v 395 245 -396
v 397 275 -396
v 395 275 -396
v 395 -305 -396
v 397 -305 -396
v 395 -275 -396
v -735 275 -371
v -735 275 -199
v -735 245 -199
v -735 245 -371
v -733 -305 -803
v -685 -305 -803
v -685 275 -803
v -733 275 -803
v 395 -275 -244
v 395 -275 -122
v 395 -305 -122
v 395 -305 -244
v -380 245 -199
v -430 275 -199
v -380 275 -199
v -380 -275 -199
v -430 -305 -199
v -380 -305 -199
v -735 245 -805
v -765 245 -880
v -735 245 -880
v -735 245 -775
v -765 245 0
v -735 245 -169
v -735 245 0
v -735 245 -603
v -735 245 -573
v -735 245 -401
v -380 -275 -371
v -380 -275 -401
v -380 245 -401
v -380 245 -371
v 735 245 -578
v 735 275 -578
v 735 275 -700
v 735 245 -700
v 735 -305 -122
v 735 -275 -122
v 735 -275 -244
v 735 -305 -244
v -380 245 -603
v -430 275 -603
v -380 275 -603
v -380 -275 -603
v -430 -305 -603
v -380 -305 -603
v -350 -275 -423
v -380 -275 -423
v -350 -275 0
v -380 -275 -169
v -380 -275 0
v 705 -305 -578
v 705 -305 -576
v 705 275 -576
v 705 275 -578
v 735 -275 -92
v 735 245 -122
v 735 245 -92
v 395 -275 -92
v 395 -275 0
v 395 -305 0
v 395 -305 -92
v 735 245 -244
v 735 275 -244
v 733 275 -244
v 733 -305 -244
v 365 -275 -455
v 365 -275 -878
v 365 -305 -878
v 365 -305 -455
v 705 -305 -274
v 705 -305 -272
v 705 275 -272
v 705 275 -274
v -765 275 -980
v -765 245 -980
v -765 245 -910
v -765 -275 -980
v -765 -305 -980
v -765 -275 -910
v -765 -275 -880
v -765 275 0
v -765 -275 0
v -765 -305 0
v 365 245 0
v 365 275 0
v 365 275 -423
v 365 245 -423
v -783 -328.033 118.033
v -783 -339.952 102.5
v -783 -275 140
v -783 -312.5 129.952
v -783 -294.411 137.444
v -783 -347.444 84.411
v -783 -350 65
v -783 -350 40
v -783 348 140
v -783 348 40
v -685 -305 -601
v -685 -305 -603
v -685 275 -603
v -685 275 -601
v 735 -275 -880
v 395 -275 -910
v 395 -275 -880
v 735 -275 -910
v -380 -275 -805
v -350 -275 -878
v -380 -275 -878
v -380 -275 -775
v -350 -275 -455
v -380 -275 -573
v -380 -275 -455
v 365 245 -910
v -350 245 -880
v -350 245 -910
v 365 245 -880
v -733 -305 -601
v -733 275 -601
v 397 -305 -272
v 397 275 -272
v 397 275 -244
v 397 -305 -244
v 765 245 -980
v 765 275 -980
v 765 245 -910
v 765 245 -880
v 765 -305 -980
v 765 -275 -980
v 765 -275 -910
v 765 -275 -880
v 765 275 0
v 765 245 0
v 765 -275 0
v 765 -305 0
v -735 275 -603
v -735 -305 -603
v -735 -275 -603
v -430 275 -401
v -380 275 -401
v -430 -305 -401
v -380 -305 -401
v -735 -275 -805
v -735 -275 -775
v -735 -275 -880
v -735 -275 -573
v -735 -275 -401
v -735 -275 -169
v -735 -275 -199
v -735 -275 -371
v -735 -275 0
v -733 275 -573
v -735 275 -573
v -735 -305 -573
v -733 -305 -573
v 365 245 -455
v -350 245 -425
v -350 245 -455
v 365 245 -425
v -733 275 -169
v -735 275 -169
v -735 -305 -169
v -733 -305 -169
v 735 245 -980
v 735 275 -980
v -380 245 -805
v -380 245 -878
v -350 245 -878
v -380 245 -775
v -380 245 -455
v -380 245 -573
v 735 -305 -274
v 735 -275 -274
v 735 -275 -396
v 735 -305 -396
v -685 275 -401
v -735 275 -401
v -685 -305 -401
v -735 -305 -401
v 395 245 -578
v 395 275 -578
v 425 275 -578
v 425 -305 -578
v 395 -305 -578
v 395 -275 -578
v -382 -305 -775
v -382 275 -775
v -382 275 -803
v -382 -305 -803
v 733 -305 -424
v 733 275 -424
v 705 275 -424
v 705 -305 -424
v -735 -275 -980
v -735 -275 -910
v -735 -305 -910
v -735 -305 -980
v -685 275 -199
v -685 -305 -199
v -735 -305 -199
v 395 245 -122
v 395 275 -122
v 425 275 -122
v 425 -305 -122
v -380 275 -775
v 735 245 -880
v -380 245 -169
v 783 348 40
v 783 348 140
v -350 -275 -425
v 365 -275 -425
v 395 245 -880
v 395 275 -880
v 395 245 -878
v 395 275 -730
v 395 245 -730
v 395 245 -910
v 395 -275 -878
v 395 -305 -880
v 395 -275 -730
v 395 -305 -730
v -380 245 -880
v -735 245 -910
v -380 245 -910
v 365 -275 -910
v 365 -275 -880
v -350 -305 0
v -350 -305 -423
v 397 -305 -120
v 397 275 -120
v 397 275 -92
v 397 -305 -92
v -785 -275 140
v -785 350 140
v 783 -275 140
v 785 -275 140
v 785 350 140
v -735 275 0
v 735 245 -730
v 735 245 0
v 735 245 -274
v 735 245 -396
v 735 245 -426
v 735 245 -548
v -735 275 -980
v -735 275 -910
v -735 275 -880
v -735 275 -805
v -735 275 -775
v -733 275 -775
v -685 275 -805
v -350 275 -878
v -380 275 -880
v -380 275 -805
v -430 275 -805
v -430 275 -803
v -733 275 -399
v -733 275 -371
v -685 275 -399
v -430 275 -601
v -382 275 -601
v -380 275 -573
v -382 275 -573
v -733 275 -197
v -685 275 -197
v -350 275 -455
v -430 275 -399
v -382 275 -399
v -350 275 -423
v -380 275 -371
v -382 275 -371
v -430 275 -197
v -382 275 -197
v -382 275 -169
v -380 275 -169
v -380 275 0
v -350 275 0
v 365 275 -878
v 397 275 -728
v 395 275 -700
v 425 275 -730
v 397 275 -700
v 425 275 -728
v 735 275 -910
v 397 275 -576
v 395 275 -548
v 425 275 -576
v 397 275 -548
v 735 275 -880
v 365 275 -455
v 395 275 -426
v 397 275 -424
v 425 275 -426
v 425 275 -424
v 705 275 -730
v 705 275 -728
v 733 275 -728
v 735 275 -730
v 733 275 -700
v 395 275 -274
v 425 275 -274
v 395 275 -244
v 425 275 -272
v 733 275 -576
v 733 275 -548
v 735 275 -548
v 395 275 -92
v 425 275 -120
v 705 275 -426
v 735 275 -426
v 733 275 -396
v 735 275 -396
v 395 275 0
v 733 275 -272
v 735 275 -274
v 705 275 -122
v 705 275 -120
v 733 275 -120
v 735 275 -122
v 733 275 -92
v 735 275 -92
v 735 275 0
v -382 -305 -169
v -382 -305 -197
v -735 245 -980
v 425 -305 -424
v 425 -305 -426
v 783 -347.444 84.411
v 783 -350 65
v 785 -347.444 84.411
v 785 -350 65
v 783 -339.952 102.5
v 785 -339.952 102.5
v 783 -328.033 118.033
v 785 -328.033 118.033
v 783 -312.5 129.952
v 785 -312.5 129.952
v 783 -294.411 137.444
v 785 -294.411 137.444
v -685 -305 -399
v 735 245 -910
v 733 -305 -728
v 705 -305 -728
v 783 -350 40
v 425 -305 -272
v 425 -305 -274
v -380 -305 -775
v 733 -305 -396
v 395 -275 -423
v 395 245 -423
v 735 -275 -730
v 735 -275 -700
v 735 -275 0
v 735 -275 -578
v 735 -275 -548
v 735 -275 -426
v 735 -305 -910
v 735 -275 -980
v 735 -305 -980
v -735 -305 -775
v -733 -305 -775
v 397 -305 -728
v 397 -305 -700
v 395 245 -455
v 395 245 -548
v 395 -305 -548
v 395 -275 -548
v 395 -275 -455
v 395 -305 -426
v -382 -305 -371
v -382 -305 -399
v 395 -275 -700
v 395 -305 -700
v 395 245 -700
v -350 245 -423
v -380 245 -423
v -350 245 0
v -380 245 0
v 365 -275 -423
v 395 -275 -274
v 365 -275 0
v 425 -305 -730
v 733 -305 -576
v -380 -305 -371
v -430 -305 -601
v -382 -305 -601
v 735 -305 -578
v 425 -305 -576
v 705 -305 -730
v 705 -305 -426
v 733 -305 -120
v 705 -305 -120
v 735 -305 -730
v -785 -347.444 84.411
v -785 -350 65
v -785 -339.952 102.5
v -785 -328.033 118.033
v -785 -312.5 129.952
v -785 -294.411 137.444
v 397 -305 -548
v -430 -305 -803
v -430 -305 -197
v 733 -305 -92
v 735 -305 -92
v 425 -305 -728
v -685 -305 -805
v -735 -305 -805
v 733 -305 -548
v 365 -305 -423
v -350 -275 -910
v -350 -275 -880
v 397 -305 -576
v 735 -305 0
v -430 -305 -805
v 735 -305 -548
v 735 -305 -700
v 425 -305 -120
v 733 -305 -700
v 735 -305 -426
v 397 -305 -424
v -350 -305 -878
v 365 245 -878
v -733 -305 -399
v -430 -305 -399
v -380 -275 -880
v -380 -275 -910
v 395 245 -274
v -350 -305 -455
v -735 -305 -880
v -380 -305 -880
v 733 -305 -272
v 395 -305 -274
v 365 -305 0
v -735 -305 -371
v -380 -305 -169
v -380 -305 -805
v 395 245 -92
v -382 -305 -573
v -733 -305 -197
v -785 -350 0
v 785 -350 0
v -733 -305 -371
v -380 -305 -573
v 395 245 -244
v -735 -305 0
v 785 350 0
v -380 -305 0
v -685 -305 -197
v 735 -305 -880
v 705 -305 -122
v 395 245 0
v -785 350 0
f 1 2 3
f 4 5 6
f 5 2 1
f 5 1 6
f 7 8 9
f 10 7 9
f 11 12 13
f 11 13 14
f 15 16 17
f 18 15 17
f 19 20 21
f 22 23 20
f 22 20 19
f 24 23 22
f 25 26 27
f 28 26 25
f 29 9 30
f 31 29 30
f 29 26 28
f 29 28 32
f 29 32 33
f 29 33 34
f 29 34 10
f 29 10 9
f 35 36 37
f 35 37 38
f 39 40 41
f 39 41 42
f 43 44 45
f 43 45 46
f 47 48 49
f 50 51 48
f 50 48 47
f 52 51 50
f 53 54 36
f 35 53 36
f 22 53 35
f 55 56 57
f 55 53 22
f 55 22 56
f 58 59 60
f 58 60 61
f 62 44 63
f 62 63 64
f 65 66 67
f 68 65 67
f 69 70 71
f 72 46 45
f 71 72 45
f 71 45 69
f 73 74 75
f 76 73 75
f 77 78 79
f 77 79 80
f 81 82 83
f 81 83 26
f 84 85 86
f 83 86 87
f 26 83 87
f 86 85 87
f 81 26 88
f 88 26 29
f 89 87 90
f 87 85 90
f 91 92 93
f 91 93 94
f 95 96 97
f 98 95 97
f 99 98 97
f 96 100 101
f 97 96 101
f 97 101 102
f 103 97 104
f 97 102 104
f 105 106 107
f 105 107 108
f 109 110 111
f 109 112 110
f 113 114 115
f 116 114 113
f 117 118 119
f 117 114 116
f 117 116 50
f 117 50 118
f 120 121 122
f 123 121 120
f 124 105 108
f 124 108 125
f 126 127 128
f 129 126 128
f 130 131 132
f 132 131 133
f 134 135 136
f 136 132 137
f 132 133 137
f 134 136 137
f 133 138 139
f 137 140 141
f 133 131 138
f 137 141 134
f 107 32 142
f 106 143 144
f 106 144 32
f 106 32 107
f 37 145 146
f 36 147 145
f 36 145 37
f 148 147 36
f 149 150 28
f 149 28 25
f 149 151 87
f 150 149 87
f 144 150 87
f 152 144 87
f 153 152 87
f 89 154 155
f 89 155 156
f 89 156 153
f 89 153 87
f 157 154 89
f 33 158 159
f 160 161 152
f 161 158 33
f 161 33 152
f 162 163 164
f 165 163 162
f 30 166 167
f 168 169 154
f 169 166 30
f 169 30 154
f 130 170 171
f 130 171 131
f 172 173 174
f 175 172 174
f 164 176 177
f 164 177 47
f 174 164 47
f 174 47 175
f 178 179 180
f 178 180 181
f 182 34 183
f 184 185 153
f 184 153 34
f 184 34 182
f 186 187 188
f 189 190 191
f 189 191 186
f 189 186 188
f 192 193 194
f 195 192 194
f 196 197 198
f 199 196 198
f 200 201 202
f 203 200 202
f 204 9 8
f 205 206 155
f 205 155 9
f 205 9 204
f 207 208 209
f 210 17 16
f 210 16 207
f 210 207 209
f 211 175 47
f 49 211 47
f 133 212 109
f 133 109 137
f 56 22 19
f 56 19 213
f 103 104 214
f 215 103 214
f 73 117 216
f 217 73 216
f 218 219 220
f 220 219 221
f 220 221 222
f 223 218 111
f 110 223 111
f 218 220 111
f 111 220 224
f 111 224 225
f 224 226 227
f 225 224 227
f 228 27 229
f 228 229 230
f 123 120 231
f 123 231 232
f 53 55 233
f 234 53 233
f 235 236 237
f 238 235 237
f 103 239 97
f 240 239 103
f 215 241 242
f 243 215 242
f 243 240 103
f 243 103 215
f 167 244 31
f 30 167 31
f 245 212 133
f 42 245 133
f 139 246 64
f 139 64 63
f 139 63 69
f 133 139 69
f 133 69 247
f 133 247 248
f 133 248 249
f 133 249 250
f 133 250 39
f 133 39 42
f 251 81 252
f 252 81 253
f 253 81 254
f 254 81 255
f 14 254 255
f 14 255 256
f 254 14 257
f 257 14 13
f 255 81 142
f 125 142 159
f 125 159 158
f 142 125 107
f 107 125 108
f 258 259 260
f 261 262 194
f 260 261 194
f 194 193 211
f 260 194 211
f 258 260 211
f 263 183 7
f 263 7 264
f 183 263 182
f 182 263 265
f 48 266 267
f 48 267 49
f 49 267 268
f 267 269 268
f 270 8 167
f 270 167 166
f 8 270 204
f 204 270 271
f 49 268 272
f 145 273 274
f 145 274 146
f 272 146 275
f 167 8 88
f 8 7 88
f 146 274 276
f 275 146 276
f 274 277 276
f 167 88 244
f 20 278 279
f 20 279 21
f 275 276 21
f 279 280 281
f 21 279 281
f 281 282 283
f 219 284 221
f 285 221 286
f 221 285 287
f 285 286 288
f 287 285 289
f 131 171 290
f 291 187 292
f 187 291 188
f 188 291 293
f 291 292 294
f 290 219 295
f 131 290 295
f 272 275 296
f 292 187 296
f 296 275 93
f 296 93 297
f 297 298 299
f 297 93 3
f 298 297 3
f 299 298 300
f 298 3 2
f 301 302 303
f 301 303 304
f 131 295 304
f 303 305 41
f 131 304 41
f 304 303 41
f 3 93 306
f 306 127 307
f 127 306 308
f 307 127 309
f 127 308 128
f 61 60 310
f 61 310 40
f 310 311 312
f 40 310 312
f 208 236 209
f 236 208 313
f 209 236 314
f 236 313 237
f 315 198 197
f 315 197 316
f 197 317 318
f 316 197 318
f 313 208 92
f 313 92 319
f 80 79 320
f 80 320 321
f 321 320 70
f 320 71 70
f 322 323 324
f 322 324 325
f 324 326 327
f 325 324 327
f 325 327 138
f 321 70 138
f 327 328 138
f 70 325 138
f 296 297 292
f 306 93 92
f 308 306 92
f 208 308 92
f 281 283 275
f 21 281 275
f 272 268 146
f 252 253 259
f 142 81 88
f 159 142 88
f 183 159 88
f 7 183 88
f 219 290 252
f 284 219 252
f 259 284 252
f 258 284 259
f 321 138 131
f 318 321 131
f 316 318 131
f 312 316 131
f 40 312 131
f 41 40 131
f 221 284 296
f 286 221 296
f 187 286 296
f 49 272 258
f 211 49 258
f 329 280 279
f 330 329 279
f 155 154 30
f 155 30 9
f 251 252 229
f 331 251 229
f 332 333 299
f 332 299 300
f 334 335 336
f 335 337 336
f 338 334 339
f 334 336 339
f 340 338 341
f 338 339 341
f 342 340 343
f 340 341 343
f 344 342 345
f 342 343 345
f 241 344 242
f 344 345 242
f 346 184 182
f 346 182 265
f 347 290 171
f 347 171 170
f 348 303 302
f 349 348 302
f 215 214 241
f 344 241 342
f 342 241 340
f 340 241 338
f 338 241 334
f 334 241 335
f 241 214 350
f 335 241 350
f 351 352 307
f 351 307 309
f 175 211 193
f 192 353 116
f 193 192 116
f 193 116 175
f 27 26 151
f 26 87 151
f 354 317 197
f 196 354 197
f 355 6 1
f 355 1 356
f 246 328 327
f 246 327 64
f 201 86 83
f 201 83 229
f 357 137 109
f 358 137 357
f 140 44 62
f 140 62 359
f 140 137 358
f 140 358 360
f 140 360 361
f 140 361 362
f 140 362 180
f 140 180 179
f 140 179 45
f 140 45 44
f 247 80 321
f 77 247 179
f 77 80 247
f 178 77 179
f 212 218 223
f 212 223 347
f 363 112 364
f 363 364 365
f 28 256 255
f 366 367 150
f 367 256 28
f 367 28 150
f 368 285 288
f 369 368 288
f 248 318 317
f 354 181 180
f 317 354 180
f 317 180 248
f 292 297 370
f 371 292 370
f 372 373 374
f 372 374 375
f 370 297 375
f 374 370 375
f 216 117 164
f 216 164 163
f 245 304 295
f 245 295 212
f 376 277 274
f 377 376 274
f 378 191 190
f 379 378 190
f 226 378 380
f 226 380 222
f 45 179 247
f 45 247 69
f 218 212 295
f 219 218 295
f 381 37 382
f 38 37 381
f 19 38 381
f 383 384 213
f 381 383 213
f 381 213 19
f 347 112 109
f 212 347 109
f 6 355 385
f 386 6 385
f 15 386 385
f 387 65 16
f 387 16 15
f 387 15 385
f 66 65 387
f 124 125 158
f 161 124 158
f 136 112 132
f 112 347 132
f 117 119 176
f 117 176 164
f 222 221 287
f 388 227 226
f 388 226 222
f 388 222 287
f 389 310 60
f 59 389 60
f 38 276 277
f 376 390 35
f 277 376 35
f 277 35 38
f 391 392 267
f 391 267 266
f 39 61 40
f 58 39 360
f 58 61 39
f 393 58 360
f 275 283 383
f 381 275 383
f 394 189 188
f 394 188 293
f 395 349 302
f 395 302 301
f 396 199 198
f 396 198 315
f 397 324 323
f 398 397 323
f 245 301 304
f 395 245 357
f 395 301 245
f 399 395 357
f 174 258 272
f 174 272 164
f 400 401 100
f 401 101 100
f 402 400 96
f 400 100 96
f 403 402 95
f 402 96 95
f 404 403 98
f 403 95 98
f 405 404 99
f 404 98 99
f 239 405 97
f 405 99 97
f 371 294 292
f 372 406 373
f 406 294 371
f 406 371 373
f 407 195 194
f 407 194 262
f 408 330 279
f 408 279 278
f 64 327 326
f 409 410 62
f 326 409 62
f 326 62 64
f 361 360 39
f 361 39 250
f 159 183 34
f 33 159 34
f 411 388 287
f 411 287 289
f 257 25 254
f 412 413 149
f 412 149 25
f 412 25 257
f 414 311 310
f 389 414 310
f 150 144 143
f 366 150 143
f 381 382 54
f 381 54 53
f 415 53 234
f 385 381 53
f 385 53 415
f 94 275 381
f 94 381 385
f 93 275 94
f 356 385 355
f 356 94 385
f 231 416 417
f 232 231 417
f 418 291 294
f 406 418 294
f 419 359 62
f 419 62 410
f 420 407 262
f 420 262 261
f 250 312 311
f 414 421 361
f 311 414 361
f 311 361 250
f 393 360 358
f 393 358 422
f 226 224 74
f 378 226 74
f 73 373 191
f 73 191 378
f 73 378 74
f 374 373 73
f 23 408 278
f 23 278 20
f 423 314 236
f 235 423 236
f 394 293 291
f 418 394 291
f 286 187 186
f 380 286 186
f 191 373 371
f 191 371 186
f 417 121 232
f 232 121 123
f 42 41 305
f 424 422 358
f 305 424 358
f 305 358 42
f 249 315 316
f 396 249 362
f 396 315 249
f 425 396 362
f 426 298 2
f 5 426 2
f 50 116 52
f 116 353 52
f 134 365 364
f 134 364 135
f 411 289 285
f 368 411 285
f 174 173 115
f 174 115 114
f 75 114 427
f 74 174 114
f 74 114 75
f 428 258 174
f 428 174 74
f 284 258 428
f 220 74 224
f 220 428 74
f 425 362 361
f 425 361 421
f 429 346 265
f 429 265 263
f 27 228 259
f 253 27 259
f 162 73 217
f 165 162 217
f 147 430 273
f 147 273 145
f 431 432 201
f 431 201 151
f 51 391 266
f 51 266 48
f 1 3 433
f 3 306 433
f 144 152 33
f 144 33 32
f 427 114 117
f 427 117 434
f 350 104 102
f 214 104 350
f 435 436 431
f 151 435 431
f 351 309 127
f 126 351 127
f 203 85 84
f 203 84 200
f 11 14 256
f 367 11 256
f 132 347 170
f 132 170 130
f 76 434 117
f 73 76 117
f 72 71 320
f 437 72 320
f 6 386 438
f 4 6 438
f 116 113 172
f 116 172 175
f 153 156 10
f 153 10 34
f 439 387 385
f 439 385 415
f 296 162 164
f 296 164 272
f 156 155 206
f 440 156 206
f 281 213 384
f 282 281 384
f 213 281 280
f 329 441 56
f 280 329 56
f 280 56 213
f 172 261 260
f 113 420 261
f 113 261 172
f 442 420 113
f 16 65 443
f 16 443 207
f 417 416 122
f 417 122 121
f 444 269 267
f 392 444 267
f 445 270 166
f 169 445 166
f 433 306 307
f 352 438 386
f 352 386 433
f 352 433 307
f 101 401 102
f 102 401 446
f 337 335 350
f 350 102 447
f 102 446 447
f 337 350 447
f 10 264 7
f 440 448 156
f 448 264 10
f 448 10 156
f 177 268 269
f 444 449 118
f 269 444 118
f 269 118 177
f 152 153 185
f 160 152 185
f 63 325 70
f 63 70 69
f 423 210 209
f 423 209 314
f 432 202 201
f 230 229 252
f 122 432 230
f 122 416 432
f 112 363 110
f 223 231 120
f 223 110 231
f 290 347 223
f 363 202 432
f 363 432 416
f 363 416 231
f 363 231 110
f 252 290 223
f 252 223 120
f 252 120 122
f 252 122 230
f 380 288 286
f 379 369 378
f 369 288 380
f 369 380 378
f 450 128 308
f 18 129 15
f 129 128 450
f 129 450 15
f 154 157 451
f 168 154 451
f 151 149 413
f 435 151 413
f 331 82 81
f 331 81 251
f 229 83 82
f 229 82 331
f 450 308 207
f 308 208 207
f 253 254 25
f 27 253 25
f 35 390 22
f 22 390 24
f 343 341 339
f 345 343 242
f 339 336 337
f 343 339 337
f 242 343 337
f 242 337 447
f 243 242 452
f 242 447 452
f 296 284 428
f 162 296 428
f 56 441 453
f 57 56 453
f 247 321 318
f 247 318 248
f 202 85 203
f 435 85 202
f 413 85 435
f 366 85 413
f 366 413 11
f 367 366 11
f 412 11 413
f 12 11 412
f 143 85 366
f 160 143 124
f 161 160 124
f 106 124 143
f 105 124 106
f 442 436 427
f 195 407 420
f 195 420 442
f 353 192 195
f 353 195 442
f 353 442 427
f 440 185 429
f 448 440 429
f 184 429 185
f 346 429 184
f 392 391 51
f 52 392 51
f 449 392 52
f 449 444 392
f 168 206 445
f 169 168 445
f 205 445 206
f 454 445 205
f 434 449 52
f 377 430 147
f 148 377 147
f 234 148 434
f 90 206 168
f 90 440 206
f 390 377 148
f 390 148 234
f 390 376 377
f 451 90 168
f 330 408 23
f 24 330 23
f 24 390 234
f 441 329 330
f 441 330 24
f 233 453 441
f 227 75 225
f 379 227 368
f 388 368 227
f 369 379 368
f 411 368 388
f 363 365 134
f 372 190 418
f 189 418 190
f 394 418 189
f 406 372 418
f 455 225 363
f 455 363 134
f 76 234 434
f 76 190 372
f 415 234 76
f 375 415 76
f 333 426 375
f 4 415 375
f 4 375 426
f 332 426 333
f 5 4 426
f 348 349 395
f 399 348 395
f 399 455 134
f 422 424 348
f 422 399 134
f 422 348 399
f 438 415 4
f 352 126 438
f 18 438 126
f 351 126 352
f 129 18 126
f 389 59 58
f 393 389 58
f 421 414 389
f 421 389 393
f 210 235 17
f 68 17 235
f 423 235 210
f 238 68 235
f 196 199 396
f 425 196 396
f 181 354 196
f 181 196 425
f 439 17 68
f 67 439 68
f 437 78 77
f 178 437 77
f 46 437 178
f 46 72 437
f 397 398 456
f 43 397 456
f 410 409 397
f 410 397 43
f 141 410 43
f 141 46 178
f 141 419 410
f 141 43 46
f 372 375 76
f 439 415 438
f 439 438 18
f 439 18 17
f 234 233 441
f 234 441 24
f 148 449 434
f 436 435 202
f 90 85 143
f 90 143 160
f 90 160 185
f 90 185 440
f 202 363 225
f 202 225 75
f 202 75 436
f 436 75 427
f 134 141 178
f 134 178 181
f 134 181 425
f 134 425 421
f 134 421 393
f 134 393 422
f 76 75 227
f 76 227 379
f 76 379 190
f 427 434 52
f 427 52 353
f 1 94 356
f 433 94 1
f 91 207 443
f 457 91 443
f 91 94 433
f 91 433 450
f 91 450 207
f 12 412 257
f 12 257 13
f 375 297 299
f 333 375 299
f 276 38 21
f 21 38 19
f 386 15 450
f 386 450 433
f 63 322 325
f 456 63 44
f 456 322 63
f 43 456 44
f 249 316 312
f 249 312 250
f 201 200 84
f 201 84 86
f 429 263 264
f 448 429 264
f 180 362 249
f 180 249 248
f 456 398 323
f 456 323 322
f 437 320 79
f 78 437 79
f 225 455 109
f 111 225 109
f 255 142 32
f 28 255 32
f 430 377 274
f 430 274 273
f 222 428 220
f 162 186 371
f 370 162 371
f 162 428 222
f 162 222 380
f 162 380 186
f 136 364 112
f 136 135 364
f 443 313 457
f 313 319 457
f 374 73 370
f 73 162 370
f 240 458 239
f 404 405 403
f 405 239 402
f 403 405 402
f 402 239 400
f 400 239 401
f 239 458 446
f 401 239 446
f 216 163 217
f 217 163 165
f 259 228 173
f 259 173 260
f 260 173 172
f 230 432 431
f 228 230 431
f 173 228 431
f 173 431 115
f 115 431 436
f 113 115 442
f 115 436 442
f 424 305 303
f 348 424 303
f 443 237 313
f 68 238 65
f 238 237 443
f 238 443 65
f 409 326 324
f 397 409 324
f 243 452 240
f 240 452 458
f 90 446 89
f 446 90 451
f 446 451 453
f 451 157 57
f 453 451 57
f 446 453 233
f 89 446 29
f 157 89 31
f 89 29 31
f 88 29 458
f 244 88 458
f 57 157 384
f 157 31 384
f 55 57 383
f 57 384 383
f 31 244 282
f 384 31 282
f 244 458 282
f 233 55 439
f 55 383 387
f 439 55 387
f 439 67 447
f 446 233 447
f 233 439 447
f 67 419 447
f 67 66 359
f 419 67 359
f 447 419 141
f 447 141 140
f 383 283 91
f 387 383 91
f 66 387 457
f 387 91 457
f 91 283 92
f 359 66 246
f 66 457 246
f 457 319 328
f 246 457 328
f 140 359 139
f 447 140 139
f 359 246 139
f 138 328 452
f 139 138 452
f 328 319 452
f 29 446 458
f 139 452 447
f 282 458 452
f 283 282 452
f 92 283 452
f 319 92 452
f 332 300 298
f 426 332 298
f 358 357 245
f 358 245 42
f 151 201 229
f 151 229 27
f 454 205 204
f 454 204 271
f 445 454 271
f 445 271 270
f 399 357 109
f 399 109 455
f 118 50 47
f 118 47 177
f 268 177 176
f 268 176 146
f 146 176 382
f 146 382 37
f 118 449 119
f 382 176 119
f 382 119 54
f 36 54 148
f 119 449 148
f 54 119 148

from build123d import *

# Parameters (mm, degrees)
F0_W           = 1570
F0_H           = 700
F1_DEPTH       = 40
F3_DEPTH       = 100
F4_R           = 75
F5_W           = 30
F5_H           = 30
F6_DEPTH       = 980
F7_W           = 30
F7_H           = 30
F8_DEPTH       = 735
F8_DEPTH_BACK  = 735
F9_W           = 30
F9_H           = 30
F10_DEPTH      = 275
F10_DEPTH_BACK = 245
F11_W          = 30
F11_H          = 30
F12_DEPTH      = 880
F13_W          = 30
F13_H          = 30
F14_DEPTH      = 365
F14_DEPTH_BACK = 350
F15_W          = 30
F15_H          = 30
F16_DEPTH      = 275
F16_DEPTH_BACK = 245
F18_DEPTH      = 2
F20_DEPTH      = 2
F22_DEPTH      = 580
F24_DEPTH      = 580


with BuildPart() as f1:
    # F0 (on Top) → F1 (new body)
    with BuildSketch(Plane.XY):
        Rectangle(F0_W, F0_H)
    extrude(amount=F1_DEPTH)

    # F2 (on face) → F3 (join)
    with BuildSketch(Plane.XY.offset(40)):
        Polygon((-785, 350), (-785, -350), (-783, -350), (-783, 348), (783, 348), (783, -350), (785, -350), (785, 350), align=None)
    extrude(amount=F3_DEPTH)

    # F4
    f4_edges = [f1.edges().sort_by_distance(p)[0] for p in [
        (-784, -350, 140),
        (784, -350, 140),
    ]]
    fillet(f4_edges, radius=F4_R)

    # F5 (on face) → F6 (join)
    with BuildSketch(Plane(origin=(0, 0, 0), x_dir=(1, 0, 0), z_dir=(0, 0, -1))):
        with Locations((-750, 290)):
            Rectangle(F5_W, F5_H)
        with Locations((750, 290)):
            Rectangle(F5_W, F5_H)
        with Locations((750, -260)):
            Rectangle(F5_W, F5_H)
        with Locations((-750, -260)):
            Rectangle(F5_W, F5_H)
    extrude(amount=F6_DEPTH)

    # F7 (on Right) → F8 (join, two sides)
    with BuildSketch(Plane.YZ) as f8_sk:
        with Locations((-290, -895)):
            Rectangle(F7_W, F7_H)
        with Locations((260, -895)):
            Rectangle(F7_W, F7_H)
    extrude(amount=F8_DEPTH)
    extrude(f8_sk.sketch, amount=-F8_DEPTH_BACK)

    # F9 (on Front) → F10 (join, two sides)
    with BuildSketch(Plane.XZ) as f10_sk:
        with Locations((-750, -895)):
            Rectangle(F9_W, F9_H)
        with Locations((750, -895)):
            Rectangle(F9_W, F9_H)
    extrude(amount=F10_DEPTH)
    extrude(f10_sk.sketch, amount=-F10_DEPTH_BACK)

    # F11 (on face) → F12 (join, through all)
    with BuildSketch(Plane(origin=(0, 0, 0), x_dir=(1, 0, 0), z_dir=(0, 0, -1))):
        with Locations((-365, 290)):
            Rectangle(F11_W, F11_H)
        with Locations((380, 290)):
            Rectangle(F11_W, F11_H)
        with Locations((380, -260)):
            Rectangle(F11_W, F11_H)
        with Locations((-365, -260)):
            Rectangle(F11_W, F11_H)
    extrude(amount=F12_DEPTH)

    # F13 (on Right) → F14 (join, two sides)
    with BuildSketch(Plane.YZ) as f14_sk:
        with Locations((-290, -440)):
            Rectangle(F13_W, F13_H)
        with Locations((260, -440)):
            Rectangle(F13_W, F13_H)
    extrude(amount=F14_DEPTH)
    extrude(f14_sk.sketch, amount=-F14_DEPTH_BACK)

    # F15 (on Front) → F16 (join, two sides)
    with BuildSketch(Plane.XZ) as f16_sk:
        with Locations((-365, -440)):
            Rectangle(F15_W, F15_H)
        with Locations((380, -440)):
            Rectangle(F15_W, F15_H)
        with Locations((380, -895)):
            Rectangle(F15_W, F15_H)
        with Locations((-365, -895)):
            Rectangle(F15_W, F15_H)
    extrude(amount=F16_DEPTH)
    extrude(f16_sk.sketch, amount=-F16_DEPTH_BACK)

    # F17 (on face) → F18 (join)
    with BuildSketch(Plane.XY.offset(-425)):
        Polygon((365, 245), (365, 275), (-350, 275), (-350, 245), (-380, 245), (-380, -275), (-350, -275), (-350, -305), (365, -305), (365, -275), (395, -275), (395, 245), align=None)
    extrude(amount=F18_DEPTH)

    # F19 (on face) → F20 (join)
    with BuildSketch(Plane.XY.offset(-880)):
        Polygon((365, 245), (365, 275), (-350, 275), (-350, 245), (-380, 245), (-380, -275), (-350, -275), (-350, -305), (365, -305), (365, -275), (395, -275), (395, 245), align=None)
    extrude(amount=F20_DEPTH)

    # F21 (on face) → F22 (join, through all)
    with BuildSketch(Plane.XZ.offset(305)):
        Polygon((-733, -775), (-735, -775), (-735, -805), (-685, -805), (-685, -803), (-733, -803), align=None)
        Polygon((-735, -573), (-735, -603), (-685, -603), (-685, -601), (-733, -601), (-733, -573), align=None)
        Polygon((-735, -371), (-735, -401), (-685, -401), (-685, -399), (-733, -399), (-733, -371), align=None)
        Polygon((-735, -169), (-735, -199), (-685, -199), (-685, -197), (-733, -197), (-733, -169), align=None)
        Polygon((-430, -803), (-430, -805), (-380, -805), (-380, -775), (-382, -775), (-382, -803), align=None)
        Polygon((-430, -601), (-430, -603), (-380, -603), (-380, -573), (-382, -573), (-382, -601), align=None)
        Polygon((-430, -399), (-430, -401), (-380, -401), (-380, -371), (-382, -371), (-382, -399), align=None)
        Polygon((-380, -169), (-382, -169), (-382, -197), (-430, -197), (-430, -199), (-380, -199), align=None)
    extrude(amount=-F22_DEPTH)

    # F23 (on face) → F24 (join, through all)
    with BuildSketch(Plane.XZ.offset(305)):
        Polygon((397, -700), (395, -700), (395, -730), (425, -730), (425, -728), (397, -728), align=None)
        Polygon((397, -548), (395, -548), (395, -578), (425, -578), (425, -576), (397, -576), align=None)
        Polygon((397, -396), (395, -396), (395, -426), (425, -426), (425, -424), (397, -424), align=None)
        Polygon((397, -244), (395, -244), (395, -274), (425, -274), (425, -272), (397, -272), align=None)
        Polygon((397, -92), (395, -92), (395, -122), (425, -122), (425, -120), (397, -120), align=None)
        Polygon((735, -244), (733, -244), (733, -272), (705, -272), (705, -274), (735, -274), align=None)
        Polygon((735, -92), (733, -92), (733, -120), (705, -120), (705, -122), (735, -122), align=None)
        Polygon((705, -424), (705, -426), (735, -426), (735, -396), (733, -396), (733, -424), align=None)
        Polygon((705, -730), (735, -730), (735, -700), (733, -700), (733, -728), (705, -728), align=None)
        Polygon((735, -578), (735, -548), (733, -548), (733, -576), (705, -576), (705, -578), align=None)
    extrude(amount=-F24_DEPTH)


solid = f1.part
